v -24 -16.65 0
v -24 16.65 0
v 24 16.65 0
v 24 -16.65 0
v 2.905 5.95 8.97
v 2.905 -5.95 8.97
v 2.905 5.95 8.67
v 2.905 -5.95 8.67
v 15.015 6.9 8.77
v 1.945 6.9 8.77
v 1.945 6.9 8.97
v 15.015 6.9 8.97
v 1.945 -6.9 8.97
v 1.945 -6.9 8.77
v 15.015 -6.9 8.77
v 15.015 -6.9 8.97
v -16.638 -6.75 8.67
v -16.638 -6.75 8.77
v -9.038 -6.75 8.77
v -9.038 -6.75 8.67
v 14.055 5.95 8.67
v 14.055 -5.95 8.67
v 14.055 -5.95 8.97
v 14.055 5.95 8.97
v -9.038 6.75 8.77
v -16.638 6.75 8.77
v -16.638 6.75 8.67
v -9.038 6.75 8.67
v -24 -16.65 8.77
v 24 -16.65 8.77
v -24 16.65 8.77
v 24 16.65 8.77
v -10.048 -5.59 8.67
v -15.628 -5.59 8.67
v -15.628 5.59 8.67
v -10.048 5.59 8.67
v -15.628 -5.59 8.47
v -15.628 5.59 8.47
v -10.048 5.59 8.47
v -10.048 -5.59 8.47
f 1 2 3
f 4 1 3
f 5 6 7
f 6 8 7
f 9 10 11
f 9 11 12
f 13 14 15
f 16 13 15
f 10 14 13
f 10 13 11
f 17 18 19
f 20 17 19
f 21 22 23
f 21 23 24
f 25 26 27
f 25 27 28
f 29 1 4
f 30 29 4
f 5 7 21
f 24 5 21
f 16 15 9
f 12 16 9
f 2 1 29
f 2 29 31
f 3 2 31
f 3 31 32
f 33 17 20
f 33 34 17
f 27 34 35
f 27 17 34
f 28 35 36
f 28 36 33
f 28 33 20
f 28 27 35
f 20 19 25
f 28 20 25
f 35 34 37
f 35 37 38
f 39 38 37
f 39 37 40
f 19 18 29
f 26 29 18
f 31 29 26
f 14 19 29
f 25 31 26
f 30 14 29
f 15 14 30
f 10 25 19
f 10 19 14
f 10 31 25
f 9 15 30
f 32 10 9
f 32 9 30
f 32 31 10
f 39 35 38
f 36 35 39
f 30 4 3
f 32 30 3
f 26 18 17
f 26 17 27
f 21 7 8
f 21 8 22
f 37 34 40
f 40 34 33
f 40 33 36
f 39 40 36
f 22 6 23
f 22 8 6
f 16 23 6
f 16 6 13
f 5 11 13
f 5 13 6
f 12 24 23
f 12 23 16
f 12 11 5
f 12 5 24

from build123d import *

# Parameters (mm, degrees)
F0_W     = 48
F0_H     = 33.3
F1_DEPTH = 8.77
F2_W     = 7.6
F2_H     = 13.5
F2_W_2   = 5.58
F2_H_2   = 11.18
F3_DEPTH = 0.1
F4_DEPTH = 0.3
F5_W     = 13.07
F5_H     = 13.8
F5_W_2   = 11.15
F5_H_2   = 11.9
F6_DEPTH = 0.2
F7_DEPTH = 0.1


with BuildPart() as f1:
    # F0 (on Top) → F1 (new body)
    with BuildSketch(Plane.XY):
        Rectangle(F0_W, F0_H)
    extrude(amount=F1_DEPTH)

    # F2 (on face) → F3 (cut, symmetric)
    with BuildSketch(Plane.XY.offset(8.77)):
        with Locations((-12.83814013, 0)):
            Rectangle(F2_W, F2_H)
        with Locations((-12.83814013, 0)):
            Rectangle(F2_W_2, F2_H_2, mode=Mode.SUBTRACT)
    extrude(amount=F3_DEPTH, both=True, mode=Mode.SUBTRACT)

    # F4 (cut): a face of the model
    f4_faces = [f1.faces().sort_by_distance(p)[0] for p in [
        (-12.83814013, 0, 8.77),
    ]]
    extrude(f4_faces, amount=-F4_DEPTH, mode=Mode.SUBTRACT)

    # F5 (on face) → F6 (join)
    with BuildSketch(Plane.XY.offset(8.77)):
        with Locations((8.4796537594, 0)):
            Rectangle(F5_W, F5_H)
        with Locations((8.4796537594, 0)):
            Rectangle(F5_W_2, F5_H_2, mode=Mode.SUBTRACT)
    extrude(amount=F6_DEPTH)

    # F7 (cut): a face of the model
    f7_faces = [f1.faces().sort_by_distance(p)[0] for p in [
        (8.4796537594, 0, 8.77),
    ]]
    extrude(f7_faces, amount=-F7_DEPTH, mode=Mode.SUBTRACT)


solid = f1.part
